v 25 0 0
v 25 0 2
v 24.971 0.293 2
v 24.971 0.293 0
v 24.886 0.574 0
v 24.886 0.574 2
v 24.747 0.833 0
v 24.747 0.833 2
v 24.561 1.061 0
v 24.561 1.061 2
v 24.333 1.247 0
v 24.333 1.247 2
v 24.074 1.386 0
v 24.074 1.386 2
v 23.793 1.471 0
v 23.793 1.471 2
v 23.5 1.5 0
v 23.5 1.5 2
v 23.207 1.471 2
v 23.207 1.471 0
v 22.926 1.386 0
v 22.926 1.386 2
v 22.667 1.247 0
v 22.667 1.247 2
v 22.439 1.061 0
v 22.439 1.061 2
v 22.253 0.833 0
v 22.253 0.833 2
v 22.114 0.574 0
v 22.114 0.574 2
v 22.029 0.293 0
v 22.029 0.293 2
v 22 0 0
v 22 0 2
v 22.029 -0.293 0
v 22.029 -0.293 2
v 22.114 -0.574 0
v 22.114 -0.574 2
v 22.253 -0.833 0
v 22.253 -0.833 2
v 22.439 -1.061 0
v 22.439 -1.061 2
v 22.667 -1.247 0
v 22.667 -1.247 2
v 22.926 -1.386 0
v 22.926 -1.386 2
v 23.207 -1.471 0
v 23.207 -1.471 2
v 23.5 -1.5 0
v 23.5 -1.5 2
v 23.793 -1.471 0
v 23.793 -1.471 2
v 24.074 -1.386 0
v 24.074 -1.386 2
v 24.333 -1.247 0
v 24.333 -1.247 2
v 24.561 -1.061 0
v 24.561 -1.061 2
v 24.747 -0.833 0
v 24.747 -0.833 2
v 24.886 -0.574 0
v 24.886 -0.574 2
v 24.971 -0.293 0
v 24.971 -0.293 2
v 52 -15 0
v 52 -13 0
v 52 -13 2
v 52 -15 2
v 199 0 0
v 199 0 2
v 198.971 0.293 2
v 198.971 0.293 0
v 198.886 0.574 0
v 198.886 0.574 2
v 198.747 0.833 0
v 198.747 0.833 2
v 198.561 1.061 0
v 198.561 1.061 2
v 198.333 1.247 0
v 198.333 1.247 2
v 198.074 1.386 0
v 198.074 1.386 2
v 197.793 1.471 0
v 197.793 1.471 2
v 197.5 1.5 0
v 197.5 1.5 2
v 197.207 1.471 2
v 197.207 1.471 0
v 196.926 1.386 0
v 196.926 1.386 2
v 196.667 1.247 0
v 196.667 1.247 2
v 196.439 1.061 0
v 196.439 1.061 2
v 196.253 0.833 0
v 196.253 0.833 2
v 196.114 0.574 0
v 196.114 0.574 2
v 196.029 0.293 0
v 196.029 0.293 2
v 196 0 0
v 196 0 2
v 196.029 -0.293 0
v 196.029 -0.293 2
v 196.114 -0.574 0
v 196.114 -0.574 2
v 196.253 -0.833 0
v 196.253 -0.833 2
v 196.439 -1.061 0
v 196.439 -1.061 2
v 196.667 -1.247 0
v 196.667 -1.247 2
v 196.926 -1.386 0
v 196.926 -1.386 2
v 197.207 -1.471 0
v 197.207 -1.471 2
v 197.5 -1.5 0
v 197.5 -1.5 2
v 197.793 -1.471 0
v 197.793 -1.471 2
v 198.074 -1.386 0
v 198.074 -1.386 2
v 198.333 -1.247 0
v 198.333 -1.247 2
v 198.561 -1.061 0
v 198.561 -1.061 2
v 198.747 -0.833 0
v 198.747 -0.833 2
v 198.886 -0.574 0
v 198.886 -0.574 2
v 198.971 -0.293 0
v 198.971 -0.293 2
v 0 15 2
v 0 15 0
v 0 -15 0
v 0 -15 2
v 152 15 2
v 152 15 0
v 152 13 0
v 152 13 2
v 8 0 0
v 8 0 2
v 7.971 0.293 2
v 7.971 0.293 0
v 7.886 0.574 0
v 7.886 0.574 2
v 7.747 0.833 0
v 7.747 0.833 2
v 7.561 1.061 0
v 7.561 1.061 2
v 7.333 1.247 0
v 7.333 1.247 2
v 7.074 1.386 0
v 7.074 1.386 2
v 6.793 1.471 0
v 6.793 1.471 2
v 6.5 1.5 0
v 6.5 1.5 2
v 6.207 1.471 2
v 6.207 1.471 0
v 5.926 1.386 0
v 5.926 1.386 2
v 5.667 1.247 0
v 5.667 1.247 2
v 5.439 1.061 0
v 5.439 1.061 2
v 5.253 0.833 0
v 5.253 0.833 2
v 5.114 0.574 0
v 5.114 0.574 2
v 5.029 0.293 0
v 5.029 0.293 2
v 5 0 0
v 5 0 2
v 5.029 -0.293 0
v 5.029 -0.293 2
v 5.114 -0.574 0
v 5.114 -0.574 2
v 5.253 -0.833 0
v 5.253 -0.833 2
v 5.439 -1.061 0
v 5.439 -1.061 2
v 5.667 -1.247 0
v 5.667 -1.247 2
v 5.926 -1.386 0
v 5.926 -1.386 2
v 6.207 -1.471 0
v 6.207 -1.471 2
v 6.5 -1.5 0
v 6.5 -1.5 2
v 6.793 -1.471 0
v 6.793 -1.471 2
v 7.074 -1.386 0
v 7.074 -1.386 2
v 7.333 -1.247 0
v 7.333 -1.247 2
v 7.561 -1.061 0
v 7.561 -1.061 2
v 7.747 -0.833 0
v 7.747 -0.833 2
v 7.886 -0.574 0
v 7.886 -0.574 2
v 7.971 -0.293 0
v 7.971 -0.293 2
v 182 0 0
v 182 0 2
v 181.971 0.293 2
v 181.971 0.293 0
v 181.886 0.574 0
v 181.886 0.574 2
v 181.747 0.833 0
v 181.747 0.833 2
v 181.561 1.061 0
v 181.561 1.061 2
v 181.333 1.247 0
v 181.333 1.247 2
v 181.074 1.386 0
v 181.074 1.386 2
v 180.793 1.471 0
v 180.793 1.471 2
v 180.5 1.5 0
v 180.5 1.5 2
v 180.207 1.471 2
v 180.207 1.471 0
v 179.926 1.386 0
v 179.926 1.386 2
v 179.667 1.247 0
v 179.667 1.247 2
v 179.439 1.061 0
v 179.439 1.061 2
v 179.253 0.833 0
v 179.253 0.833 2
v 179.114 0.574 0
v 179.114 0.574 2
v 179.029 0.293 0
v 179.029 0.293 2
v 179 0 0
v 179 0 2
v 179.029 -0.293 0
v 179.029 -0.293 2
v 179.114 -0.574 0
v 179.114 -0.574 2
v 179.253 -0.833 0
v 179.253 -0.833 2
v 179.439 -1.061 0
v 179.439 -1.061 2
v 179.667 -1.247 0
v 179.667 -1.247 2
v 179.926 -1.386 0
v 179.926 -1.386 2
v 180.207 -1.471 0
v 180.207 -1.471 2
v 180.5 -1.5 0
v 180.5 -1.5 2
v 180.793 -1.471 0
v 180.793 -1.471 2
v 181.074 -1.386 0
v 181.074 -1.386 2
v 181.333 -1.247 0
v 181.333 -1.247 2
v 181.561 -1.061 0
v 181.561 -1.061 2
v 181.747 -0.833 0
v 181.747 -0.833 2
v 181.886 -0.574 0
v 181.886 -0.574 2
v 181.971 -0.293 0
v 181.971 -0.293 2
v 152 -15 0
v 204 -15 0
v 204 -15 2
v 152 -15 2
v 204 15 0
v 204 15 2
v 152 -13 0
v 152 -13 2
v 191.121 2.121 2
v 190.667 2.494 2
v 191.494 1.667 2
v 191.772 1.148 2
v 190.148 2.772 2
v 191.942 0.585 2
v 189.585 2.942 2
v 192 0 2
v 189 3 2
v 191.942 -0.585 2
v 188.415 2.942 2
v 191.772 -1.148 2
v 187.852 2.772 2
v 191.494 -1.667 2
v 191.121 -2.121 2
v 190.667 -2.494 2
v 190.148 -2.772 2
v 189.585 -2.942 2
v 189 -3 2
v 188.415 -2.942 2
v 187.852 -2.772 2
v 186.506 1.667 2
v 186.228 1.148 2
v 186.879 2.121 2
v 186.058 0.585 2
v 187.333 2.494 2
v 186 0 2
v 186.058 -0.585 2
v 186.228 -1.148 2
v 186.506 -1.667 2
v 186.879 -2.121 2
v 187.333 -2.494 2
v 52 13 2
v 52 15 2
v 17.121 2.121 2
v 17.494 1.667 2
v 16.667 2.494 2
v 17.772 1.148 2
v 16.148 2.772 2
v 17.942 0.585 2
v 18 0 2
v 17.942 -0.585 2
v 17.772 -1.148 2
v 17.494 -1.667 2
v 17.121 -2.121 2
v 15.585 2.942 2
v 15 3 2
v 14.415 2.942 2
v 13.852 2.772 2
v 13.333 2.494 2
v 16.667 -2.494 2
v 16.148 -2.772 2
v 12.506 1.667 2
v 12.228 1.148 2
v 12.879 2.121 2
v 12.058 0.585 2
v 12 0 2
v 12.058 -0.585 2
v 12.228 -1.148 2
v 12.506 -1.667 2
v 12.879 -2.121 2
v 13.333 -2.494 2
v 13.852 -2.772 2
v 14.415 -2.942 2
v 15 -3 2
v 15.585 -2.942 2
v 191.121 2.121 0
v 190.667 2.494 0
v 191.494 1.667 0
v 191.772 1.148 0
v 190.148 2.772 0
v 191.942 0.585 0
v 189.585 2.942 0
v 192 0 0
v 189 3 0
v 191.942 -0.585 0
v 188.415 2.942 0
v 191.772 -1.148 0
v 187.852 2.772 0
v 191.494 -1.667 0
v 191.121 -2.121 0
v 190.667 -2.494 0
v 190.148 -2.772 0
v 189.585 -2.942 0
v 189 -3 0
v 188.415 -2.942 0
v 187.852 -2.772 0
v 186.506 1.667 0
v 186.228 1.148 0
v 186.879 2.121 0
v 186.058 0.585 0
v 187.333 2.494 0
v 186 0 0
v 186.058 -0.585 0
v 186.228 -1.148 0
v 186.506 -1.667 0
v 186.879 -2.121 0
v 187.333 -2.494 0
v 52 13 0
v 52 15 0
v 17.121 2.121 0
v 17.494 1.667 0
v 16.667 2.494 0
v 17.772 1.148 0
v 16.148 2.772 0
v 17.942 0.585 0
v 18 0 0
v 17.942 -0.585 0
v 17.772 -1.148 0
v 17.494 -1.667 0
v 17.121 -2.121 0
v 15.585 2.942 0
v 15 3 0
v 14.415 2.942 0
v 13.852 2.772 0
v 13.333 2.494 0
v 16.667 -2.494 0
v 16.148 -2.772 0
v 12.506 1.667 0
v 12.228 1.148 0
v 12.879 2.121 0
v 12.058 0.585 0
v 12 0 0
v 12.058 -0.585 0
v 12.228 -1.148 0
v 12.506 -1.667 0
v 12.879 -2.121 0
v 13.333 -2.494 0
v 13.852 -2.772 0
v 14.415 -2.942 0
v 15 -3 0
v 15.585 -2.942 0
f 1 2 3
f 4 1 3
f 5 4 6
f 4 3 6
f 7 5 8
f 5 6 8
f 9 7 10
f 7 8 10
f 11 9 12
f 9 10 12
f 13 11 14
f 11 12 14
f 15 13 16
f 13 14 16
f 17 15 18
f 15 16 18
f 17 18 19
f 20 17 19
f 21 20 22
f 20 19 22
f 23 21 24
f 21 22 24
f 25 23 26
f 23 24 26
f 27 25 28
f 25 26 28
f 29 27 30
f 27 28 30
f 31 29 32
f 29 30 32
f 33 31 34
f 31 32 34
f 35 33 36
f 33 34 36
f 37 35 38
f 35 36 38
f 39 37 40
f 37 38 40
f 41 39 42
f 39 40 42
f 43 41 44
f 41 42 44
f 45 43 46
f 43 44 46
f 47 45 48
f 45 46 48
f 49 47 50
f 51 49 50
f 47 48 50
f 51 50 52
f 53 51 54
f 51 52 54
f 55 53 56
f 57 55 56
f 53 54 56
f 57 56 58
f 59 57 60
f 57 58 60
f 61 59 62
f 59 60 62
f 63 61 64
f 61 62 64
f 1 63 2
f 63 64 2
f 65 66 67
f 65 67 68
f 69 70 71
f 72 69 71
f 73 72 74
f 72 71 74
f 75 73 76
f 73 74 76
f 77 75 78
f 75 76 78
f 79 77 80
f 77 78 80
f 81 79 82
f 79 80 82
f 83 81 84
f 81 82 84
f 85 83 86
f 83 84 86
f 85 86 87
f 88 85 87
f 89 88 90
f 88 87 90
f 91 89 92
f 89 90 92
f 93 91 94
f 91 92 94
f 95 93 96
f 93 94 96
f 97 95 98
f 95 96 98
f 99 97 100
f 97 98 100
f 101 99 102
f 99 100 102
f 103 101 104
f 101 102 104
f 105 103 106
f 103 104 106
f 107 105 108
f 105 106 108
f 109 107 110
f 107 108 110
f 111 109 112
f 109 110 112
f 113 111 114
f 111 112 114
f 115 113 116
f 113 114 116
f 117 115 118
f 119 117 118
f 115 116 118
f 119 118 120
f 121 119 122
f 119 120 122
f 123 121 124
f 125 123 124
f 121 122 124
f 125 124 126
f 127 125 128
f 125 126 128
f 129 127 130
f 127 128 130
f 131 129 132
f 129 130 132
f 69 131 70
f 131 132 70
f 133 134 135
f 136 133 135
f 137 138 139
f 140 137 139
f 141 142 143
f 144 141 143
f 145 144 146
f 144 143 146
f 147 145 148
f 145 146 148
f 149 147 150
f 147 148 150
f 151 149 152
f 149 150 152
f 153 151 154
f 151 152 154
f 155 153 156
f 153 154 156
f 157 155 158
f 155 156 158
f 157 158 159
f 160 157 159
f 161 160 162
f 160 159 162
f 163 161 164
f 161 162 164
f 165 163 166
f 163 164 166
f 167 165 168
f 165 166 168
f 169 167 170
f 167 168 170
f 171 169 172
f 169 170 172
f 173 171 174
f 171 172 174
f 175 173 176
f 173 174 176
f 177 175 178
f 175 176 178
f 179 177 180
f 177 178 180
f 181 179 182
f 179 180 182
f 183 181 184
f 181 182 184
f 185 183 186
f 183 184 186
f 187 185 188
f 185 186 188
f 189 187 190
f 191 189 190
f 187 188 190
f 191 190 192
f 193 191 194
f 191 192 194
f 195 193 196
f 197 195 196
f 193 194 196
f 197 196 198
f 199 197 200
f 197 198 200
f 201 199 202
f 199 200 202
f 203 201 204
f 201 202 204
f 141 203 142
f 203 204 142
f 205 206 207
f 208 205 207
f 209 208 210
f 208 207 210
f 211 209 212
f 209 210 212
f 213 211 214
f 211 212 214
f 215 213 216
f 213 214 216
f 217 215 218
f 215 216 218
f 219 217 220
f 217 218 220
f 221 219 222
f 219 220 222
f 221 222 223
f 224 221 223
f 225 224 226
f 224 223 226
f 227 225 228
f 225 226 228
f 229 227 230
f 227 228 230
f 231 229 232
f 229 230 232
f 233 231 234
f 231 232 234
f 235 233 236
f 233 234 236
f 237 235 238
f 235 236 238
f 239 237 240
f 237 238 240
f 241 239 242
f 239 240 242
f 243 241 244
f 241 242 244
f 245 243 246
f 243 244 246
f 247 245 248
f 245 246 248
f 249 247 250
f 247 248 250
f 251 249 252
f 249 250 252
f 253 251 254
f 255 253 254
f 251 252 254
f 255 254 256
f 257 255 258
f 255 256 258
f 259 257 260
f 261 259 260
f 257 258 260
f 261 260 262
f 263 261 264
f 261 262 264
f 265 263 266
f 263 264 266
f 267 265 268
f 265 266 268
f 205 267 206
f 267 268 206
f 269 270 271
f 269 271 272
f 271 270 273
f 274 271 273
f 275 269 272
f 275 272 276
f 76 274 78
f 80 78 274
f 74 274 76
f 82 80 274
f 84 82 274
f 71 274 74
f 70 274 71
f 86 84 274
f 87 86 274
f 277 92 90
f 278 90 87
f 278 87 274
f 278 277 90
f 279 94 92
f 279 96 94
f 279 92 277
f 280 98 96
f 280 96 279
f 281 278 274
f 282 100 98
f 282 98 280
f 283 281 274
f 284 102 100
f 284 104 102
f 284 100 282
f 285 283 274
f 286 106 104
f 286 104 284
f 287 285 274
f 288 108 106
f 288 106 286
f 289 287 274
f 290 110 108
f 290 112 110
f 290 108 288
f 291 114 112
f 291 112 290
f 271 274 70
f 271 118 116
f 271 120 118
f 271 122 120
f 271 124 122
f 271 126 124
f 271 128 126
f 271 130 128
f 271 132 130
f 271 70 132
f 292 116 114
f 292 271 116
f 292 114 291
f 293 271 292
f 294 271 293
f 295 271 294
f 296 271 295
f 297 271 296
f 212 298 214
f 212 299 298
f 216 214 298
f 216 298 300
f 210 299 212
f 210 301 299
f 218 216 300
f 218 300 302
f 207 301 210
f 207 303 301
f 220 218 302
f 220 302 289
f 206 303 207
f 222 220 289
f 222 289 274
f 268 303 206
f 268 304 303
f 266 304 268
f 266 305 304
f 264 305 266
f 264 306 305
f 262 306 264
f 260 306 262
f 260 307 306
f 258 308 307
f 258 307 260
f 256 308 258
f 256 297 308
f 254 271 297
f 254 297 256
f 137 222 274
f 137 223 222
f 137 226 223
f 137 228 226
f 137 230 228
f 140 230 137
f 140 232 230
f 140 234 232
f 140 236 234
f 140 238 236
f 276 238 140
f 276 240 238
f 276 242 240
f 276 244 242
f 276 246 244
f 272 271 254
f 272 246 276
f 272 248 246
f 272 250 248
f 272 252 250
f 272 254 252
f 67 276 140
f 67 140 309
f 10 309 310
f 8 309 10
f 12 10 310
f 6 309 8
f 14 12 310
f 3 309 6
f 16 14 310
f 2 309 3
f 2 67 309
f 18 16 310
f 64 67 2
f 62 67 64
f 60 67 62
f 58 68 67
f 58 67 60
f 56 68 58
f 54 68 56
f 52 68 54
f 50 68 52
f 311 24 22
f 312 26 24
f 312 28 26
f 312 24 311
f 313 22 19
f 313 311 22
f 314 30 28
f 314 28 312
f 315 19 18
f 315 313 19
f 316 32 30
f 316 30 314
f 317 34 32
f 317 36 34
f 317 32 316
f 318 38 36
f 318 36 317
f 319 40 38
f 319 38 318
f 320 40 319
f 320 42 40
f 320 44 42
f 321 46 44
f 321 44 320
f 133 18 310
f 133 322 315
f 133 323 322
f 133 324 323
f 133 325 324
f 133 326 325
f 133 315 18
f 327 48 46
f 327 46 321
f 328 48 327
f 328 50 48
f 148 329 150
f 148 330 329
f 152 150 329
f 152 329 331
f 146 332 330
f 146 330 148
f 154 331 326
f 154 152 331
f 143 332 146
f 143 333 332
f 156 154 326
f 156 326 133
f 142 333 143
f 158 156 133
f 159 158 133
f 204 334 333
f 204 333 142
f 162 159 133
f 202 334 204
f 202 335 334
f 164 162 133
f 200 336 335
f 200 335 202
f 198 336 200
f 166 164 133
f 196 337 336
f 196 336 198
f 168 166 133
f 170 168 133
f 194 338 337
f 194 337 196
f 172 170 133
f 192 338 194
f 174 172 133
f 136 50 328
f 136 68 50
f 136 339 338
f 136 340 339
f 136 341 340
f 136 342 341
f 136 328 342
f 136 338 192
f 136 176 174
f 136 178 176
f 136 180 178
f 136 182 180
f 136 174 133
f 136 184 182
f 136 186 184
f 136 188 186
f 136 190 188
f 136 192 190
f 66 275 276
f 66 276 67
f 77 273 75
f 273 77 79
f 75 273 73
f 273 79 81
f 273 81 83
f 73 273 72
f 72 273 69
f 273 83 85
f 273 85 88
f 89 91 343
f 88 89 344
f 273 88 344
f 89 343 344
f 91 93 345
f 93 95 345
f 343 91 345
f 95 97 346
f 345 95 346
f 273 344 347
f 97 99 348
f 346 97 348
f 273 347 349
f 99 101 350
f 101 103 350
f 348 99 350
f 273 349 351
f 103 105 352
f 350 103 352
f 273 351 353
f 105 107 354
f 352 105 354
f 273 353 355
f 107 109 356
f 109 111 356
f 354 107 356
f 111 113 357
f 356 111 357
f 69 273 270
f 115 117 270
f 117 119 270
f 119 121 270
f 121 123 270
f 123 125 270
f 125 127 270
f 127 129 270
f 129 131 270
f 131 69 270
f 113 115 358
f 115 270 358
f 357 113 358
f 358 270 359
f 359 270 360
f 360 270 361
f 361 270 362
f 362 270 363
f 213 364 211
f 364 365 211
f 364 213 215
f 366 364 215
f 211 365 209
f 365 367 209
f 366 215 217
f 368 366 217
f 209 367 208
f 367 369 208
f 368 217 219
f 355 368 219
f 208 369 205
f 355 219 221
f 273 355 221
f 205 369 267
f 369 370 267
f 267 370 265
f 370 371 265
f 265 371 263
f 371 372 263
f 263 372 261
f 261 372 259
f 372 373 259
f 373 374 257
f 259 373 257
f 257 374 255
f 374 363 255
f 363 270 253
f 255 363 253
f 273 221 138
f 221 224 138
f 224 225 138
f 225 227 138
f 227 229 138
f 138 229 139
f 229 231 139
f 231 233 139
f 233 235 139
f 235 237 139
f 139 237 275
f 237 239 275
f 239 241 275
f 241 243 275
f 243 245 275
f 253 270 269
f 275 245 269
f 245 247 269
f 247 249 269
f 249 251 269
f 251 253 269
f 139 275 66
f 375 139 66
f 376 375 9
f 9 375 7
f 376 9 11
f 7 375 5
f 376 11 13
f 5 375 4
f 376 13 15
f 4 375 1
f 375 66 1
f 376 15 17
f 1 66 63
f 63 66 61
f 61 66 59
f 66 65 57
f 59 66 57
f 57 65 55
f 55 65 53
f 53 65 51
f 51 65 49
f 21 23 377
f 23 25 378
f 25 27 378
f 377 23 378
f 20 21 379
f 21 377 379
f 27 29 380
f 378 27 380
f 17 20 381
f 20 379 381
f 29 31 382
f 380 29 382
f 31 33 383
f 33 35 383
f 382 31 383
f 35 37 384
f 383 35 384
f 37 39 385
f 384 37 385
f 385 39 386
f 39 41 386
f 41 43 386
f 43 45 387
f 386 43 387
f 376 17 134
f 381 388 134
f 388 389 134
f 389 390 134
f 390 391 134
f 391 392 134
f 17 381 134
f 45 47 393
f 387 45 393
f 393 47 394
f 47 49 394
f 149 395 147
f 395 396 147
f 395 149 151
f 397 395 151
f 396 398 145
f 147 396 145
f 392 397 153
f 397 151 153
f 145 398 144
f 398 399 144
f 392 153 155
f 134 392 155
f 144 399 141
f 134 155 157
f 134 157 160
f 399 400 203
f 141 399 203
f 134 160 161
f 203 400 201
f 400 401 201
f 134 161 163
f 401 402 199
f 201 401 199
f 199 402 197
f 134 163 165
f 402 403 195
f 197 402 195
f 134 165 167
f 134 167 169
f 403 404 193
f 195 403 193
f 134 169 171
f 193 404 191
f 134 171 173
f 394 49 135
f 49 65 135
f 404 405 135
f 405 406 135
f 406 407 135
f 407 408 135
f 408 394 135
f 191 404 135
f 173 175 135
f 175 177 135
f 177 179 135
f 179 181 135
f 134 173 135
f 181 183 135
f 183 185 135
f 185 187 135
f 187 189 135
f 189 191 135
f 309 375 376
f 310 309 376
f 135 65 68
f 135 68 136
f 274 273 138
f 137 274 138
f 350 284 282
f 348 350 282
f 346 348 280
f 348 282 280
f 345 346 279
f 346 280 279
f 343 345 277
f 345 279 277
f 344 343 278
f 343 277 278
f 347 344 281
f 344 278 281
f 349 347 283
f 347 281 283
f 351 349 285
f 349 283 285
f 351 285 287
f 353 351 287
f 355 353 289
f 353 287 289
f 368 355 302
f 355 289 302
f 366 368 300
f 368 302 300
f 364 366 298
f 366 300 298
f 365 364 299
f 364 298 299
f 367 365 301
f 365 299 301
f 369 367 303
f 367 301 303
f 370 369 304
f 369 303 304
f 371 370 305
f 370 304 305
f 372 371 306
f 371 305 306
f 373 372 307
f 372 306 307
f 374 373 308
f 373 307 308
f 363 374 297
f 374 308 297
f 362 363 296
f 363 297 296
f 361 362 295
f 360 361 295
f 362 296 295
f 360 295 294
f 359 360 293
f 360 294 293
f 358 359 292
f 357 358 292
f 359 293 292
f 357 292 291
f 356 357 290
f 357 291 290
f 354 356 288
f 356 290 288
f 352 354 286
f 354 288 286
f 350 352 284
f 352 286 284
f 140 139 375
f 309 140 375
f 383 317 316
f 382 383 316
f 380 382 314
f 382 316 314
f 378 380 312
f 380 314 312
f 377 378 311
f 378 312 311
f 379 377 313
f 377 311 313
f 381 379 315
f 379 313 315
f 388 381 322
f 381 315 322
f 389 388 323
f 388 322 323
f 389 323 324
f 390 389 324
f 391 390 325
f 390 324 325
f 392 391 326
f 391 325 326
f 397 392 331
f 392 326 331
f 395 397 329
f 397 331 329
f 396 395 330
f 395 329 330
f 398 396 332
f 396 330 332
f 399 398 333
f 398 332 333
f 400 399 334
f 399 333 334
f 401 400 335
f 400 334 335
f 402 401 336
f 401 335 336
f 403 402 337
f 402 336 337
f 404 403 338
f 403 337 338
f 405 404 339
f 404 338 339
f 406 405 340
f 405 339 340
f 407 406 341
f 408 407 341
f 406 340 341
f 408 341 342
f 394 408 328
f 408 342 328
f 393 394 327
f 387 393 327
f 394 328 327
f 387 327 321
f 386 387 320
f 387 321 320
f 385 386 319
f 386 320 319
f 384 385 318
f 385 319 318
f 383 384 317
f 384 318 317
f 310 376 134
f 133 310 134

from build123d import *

# Parameters (mm, degrees)
BOSS_EXTRUDE1_DEPTH = 2
SKETCH2_R           = 1.5
SKETCH2_R_2         = 3
CUT_EXTRUDE1_DEPTH  = 2


with BuildPart() as part:
    # Sketch1 → Boss-Extrude1 (new body)
    with BuildSketch(Plane.XY):
        Polygon((0, -15), (0, 0), (204, 0), (204, -15), (152, -15), (152, -13), (52, -13), (52, -15), align=None)
    boss_extrude1 = extrude(amount=BOSS_EXTRUDE1_DEPTH)

    # Mirror2: Boss-Extrude1 across plane
    add(boss_extrude1.mirror(Plane(origin=(0, 0, 2), x_dir=(0, 0, 1), z_dir=(0, -1, 0))))

    # Sketch2 → Cut-Extrude1 (cut)
    with BuildSketch(Plane.XY.offset(2)):
        with Locations((6.5, 0)):
            Circle(SKETCH2_R)
        with Locations((15, 0)):
            Circle(SKETCH2_R_2)
        with Locations((23.5, 0)):
            Circle(SKETCH2_R)
        with Locations((180.5, 0)):
            Circle(SKETCH2_R)
        with Locations((189, 0)):
            Circle(SKETCH2_R_2)
        with Locations((197.5, 0)):
            Circle(SKETCH2_R)
    extrude(amount=-CUT_EXTRUDE1_DEPTH, mode=Mode.SUBTRACT)


solid = part.part
